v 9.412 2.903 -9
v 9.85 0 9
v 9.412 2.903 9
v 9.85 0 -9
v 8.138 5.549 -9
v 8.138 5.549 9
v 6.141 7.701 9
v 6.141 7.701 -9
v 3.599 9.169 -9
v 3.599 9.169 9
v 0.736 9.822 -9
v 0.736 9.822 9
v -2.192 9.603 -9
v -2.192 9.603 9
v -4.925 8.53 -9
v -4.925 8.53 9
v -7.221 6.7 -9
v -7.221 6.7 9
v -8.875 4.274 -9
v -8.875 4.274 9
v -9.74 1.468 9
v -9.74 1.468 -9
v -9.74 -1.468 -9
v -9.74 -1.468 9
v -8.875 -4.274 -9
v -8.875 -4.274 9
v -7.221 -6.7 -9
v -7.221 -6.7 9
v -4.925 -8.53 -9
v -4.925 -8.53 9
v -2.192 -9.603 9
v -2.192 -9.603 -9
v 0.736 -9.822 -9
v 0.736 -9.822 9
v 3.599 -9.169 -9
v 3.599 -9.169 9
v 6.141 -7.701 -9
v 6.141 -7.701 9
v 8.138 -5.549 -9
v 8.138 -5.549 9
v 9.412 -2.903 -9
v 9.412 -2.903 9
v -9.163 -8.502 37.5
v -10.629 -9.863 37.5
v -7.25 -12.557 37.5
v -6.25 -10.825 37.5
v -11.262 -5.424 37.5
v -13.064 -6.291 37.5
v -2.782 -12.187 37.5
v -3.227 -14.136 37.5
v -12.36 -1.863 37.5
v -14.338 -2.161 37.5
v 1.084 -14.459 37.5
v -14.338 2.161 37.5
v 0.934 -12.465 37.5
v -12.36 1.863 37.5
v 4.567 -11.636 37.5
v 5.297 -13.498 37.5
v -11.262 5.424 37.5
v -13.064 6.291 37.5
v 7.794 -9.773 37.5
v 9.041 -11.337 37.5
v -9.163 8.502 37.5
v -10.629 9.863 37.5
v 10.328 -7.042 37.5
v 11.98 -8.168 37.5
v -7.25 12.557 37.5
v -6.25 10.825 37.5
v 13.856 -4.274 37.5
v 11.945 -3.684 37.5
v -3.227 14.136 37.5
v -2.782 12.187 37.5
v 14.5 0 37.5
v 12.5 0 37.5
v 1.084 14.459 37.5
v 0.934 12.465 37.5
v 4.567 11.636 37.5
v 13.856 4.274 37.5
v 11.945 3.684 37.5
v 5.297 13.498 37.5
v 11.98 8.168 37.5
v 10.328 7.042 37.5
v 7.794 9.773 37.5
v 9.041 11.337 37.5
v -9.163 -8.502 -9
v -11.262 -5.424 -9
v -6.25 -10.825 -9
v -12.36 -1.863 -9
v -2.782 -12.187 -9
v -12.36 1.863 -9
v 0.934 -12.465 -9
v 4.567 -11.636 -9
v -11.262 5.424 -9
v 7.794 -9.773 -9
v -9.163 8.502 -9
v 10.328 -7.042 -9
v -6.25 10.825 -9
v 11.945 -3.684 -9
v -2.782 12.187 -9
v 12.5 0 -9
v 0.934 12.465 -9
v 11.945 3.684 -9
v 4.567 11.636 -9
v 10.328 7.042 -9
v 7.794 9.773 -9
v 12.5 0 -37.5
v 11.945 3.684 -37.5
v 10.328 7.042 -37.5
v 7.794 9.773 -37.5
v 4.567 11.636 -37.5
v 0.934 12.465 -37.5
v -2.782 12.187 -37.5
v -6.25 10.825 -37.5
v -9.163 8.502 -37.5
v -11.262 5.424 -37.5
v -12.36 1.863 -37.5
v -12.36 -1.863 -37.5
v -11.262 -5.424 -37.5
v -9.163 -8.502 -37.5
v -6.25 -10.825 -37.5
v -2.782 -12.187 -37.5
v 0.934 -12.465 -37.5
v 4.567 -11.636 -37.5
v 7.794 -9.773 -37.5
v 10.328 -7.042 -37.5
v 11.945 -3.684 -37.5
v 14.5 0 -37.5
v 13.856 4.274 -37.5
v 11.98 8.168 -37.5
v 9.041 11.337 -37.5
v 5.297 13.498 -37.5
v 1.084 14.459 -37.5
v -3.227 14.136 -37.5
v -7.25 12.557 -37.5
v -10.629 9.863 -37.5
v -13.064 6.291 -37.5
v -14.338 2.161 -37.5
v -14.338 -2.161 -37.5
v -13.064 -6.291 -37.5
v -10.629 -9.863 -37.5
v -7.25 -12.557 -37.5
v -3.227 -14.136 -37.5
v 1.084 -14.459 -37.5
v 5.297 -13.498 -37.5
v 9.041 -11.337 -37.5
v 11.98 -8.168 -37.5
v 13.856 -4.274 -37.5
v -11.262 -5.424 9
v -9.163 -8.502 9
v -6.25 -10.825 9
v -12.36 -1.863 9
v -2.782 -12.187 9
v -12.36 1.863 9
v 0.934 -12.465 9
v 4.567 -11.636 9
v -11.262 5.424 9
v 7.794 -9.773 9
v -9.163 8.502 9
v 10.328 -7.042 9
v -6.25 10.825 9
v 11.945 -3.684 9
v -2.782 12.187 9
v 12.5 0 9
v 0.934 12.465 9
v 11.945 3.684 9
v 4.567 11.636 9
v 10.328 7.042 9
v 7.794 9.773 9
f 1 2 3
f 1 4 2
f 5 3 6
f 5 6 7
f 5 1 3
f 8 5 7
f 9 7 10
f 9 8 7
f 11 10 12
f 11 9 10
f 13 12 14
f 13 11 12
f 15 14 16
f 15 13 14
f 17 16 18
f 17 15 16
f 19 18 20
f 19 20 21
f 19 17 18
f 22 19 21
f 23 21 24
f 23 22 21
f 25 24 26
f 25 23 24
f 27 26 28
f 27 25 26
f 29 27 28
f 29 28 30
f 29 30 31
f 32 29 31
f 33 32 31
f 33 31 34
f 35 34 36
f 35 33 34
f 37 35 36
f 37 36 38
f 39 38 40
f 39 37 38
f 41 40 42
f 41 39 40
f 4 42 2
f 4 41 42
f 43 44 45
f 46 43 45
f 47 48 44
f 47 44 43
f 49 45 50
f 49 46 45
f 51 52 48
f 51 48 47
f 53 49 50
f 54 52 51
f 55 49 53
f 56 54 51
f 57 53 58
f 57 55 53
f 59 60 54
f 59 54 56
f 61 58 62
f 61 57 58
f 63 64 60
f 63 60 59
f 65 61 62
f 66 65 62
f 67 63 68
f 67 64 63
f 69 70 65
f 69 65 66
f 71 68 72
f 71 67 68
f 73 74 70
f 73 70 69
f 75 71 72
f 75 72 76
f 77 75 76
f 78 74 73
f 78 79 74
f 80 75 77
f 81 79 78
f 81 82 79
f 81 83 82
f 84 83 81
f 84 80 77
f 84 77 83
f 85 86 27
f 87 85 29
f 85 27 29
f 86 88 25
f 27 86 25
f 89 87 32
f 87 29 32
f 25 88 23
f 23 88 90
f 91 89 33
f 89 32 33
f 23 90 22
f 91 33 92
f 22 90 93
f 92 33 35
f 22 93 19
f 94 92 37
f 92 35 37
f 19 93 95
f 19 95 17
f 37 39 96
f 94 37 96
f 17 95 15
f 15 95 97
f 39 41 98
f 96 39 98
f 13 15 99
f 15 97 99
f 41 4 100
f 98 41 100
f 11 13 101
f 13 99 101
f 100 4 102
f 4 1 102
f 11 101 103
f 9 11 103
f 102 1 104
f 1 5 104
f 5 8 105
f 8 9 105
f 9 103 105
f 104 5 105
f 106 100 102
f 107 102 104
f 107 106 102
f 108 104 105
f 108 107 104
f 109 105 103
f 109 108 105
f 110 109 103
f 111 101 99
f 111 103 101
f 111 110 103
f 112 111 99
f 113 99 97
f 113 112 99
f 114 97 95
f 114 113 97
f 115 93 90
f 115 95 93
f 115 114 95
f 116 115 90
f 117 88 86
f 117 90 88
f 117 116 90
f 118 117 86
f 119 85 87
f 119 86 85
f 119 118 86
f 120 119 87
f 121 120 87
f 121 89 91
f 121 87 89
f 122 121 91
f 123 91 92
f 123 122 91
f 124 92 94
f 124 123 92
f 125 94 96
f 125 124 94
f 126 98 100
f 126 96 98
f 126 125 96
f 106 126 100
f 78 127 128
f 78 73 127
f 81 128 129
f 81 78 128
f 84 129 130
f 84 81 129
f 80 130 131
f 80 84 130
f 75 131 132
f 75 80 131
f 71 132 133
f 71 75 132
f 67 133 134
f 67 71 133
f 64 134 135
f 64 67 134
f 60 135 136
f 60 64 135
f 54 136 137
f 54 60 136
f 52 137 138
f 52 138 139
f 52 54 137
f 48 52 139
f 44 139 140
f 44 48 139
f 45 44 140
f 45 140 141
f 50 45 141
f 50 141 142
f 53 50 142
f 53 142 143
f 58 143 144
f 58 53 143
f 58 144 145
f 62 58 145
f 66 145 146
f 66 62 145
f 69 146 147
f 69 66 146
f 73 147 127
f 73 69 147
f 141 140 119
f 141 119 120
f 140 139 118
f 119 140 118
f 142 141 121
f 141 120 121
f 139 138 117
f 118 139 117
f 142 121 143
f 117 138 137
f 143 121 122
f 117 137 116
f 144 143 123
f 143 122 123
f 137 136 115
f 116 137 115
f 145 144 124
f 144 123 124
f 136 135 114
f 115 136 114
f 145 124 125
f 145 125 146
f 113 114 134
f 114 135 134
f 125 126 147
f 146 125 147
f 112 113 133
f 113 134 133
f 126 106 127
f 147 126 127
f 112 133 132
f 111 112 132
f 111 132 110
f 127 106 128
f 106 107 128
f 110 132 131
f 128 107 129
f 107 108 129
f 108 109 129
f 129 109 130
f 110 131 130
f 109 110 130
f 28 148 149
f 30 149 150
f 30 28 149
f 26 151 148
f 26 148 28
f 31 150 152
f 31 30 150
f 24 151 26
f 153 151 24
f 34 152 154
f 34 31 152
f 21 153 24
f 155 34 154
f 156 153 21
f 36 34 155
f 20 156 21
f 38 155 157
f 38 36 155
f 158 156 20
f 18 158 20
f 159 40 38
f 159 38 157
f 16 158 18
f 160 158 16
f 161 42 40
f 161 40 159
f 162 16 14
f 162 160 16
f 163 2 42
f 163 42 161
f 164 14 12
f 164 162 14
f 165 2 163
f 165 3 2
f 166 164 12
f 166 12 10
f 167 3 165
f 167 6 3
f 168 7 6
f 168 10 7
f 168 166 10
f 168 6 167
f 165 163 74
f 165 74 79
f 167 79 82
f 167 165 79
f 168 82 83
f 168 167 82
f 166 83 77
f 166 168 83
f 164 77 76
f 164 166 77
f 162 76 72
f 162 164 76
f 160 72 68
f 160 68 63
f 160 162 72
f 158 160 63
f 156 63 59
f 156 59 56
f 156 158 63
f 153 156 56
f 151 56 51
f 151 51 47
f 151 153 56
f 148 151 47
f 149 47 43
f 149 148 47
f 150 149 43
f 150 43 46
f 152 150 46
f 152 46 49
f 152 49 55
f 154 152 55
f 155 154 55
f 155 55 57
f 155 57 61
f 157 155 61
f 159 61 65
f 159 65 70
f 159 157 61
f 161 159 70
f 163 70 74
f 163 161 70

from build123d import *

# Parameters (mm, degrees)
SKETCH1_R           = 14.5
SKETCH1_R_2         = 9.85
BOSS_EXTRUDE1_DEPTH = 9
SKETCH2_R           = 14.5
SKETCH2_R_2         = 12.5
BOSS_EXTRUDE2_DEPTH = 37.5


with BuildPart() as part:
    # Sketch1 → Boss-Extrude1 (new body, symmetric)
    with BuildSketch(Plane.XY):
        Circle(SKETCH1_R)
        Circle(SKETCH1_R_2, mode=Mode.SUBTRACT)
    extrude(amount=BOSS_EXTRUDE1_DEPTH, both=True)

    # Sketch2 → Boss-Extrude2 (add, symmetric)
    with BuildSketch(Plane.XY):
        Circle(SKETCH2_R)
        Circle(SKETCH2_R_2, mode=Mode.SUBTRACT)
    extrude(amount=BOSS_EXTRUDE2_DEPTH, both=True)


solid = part.part
